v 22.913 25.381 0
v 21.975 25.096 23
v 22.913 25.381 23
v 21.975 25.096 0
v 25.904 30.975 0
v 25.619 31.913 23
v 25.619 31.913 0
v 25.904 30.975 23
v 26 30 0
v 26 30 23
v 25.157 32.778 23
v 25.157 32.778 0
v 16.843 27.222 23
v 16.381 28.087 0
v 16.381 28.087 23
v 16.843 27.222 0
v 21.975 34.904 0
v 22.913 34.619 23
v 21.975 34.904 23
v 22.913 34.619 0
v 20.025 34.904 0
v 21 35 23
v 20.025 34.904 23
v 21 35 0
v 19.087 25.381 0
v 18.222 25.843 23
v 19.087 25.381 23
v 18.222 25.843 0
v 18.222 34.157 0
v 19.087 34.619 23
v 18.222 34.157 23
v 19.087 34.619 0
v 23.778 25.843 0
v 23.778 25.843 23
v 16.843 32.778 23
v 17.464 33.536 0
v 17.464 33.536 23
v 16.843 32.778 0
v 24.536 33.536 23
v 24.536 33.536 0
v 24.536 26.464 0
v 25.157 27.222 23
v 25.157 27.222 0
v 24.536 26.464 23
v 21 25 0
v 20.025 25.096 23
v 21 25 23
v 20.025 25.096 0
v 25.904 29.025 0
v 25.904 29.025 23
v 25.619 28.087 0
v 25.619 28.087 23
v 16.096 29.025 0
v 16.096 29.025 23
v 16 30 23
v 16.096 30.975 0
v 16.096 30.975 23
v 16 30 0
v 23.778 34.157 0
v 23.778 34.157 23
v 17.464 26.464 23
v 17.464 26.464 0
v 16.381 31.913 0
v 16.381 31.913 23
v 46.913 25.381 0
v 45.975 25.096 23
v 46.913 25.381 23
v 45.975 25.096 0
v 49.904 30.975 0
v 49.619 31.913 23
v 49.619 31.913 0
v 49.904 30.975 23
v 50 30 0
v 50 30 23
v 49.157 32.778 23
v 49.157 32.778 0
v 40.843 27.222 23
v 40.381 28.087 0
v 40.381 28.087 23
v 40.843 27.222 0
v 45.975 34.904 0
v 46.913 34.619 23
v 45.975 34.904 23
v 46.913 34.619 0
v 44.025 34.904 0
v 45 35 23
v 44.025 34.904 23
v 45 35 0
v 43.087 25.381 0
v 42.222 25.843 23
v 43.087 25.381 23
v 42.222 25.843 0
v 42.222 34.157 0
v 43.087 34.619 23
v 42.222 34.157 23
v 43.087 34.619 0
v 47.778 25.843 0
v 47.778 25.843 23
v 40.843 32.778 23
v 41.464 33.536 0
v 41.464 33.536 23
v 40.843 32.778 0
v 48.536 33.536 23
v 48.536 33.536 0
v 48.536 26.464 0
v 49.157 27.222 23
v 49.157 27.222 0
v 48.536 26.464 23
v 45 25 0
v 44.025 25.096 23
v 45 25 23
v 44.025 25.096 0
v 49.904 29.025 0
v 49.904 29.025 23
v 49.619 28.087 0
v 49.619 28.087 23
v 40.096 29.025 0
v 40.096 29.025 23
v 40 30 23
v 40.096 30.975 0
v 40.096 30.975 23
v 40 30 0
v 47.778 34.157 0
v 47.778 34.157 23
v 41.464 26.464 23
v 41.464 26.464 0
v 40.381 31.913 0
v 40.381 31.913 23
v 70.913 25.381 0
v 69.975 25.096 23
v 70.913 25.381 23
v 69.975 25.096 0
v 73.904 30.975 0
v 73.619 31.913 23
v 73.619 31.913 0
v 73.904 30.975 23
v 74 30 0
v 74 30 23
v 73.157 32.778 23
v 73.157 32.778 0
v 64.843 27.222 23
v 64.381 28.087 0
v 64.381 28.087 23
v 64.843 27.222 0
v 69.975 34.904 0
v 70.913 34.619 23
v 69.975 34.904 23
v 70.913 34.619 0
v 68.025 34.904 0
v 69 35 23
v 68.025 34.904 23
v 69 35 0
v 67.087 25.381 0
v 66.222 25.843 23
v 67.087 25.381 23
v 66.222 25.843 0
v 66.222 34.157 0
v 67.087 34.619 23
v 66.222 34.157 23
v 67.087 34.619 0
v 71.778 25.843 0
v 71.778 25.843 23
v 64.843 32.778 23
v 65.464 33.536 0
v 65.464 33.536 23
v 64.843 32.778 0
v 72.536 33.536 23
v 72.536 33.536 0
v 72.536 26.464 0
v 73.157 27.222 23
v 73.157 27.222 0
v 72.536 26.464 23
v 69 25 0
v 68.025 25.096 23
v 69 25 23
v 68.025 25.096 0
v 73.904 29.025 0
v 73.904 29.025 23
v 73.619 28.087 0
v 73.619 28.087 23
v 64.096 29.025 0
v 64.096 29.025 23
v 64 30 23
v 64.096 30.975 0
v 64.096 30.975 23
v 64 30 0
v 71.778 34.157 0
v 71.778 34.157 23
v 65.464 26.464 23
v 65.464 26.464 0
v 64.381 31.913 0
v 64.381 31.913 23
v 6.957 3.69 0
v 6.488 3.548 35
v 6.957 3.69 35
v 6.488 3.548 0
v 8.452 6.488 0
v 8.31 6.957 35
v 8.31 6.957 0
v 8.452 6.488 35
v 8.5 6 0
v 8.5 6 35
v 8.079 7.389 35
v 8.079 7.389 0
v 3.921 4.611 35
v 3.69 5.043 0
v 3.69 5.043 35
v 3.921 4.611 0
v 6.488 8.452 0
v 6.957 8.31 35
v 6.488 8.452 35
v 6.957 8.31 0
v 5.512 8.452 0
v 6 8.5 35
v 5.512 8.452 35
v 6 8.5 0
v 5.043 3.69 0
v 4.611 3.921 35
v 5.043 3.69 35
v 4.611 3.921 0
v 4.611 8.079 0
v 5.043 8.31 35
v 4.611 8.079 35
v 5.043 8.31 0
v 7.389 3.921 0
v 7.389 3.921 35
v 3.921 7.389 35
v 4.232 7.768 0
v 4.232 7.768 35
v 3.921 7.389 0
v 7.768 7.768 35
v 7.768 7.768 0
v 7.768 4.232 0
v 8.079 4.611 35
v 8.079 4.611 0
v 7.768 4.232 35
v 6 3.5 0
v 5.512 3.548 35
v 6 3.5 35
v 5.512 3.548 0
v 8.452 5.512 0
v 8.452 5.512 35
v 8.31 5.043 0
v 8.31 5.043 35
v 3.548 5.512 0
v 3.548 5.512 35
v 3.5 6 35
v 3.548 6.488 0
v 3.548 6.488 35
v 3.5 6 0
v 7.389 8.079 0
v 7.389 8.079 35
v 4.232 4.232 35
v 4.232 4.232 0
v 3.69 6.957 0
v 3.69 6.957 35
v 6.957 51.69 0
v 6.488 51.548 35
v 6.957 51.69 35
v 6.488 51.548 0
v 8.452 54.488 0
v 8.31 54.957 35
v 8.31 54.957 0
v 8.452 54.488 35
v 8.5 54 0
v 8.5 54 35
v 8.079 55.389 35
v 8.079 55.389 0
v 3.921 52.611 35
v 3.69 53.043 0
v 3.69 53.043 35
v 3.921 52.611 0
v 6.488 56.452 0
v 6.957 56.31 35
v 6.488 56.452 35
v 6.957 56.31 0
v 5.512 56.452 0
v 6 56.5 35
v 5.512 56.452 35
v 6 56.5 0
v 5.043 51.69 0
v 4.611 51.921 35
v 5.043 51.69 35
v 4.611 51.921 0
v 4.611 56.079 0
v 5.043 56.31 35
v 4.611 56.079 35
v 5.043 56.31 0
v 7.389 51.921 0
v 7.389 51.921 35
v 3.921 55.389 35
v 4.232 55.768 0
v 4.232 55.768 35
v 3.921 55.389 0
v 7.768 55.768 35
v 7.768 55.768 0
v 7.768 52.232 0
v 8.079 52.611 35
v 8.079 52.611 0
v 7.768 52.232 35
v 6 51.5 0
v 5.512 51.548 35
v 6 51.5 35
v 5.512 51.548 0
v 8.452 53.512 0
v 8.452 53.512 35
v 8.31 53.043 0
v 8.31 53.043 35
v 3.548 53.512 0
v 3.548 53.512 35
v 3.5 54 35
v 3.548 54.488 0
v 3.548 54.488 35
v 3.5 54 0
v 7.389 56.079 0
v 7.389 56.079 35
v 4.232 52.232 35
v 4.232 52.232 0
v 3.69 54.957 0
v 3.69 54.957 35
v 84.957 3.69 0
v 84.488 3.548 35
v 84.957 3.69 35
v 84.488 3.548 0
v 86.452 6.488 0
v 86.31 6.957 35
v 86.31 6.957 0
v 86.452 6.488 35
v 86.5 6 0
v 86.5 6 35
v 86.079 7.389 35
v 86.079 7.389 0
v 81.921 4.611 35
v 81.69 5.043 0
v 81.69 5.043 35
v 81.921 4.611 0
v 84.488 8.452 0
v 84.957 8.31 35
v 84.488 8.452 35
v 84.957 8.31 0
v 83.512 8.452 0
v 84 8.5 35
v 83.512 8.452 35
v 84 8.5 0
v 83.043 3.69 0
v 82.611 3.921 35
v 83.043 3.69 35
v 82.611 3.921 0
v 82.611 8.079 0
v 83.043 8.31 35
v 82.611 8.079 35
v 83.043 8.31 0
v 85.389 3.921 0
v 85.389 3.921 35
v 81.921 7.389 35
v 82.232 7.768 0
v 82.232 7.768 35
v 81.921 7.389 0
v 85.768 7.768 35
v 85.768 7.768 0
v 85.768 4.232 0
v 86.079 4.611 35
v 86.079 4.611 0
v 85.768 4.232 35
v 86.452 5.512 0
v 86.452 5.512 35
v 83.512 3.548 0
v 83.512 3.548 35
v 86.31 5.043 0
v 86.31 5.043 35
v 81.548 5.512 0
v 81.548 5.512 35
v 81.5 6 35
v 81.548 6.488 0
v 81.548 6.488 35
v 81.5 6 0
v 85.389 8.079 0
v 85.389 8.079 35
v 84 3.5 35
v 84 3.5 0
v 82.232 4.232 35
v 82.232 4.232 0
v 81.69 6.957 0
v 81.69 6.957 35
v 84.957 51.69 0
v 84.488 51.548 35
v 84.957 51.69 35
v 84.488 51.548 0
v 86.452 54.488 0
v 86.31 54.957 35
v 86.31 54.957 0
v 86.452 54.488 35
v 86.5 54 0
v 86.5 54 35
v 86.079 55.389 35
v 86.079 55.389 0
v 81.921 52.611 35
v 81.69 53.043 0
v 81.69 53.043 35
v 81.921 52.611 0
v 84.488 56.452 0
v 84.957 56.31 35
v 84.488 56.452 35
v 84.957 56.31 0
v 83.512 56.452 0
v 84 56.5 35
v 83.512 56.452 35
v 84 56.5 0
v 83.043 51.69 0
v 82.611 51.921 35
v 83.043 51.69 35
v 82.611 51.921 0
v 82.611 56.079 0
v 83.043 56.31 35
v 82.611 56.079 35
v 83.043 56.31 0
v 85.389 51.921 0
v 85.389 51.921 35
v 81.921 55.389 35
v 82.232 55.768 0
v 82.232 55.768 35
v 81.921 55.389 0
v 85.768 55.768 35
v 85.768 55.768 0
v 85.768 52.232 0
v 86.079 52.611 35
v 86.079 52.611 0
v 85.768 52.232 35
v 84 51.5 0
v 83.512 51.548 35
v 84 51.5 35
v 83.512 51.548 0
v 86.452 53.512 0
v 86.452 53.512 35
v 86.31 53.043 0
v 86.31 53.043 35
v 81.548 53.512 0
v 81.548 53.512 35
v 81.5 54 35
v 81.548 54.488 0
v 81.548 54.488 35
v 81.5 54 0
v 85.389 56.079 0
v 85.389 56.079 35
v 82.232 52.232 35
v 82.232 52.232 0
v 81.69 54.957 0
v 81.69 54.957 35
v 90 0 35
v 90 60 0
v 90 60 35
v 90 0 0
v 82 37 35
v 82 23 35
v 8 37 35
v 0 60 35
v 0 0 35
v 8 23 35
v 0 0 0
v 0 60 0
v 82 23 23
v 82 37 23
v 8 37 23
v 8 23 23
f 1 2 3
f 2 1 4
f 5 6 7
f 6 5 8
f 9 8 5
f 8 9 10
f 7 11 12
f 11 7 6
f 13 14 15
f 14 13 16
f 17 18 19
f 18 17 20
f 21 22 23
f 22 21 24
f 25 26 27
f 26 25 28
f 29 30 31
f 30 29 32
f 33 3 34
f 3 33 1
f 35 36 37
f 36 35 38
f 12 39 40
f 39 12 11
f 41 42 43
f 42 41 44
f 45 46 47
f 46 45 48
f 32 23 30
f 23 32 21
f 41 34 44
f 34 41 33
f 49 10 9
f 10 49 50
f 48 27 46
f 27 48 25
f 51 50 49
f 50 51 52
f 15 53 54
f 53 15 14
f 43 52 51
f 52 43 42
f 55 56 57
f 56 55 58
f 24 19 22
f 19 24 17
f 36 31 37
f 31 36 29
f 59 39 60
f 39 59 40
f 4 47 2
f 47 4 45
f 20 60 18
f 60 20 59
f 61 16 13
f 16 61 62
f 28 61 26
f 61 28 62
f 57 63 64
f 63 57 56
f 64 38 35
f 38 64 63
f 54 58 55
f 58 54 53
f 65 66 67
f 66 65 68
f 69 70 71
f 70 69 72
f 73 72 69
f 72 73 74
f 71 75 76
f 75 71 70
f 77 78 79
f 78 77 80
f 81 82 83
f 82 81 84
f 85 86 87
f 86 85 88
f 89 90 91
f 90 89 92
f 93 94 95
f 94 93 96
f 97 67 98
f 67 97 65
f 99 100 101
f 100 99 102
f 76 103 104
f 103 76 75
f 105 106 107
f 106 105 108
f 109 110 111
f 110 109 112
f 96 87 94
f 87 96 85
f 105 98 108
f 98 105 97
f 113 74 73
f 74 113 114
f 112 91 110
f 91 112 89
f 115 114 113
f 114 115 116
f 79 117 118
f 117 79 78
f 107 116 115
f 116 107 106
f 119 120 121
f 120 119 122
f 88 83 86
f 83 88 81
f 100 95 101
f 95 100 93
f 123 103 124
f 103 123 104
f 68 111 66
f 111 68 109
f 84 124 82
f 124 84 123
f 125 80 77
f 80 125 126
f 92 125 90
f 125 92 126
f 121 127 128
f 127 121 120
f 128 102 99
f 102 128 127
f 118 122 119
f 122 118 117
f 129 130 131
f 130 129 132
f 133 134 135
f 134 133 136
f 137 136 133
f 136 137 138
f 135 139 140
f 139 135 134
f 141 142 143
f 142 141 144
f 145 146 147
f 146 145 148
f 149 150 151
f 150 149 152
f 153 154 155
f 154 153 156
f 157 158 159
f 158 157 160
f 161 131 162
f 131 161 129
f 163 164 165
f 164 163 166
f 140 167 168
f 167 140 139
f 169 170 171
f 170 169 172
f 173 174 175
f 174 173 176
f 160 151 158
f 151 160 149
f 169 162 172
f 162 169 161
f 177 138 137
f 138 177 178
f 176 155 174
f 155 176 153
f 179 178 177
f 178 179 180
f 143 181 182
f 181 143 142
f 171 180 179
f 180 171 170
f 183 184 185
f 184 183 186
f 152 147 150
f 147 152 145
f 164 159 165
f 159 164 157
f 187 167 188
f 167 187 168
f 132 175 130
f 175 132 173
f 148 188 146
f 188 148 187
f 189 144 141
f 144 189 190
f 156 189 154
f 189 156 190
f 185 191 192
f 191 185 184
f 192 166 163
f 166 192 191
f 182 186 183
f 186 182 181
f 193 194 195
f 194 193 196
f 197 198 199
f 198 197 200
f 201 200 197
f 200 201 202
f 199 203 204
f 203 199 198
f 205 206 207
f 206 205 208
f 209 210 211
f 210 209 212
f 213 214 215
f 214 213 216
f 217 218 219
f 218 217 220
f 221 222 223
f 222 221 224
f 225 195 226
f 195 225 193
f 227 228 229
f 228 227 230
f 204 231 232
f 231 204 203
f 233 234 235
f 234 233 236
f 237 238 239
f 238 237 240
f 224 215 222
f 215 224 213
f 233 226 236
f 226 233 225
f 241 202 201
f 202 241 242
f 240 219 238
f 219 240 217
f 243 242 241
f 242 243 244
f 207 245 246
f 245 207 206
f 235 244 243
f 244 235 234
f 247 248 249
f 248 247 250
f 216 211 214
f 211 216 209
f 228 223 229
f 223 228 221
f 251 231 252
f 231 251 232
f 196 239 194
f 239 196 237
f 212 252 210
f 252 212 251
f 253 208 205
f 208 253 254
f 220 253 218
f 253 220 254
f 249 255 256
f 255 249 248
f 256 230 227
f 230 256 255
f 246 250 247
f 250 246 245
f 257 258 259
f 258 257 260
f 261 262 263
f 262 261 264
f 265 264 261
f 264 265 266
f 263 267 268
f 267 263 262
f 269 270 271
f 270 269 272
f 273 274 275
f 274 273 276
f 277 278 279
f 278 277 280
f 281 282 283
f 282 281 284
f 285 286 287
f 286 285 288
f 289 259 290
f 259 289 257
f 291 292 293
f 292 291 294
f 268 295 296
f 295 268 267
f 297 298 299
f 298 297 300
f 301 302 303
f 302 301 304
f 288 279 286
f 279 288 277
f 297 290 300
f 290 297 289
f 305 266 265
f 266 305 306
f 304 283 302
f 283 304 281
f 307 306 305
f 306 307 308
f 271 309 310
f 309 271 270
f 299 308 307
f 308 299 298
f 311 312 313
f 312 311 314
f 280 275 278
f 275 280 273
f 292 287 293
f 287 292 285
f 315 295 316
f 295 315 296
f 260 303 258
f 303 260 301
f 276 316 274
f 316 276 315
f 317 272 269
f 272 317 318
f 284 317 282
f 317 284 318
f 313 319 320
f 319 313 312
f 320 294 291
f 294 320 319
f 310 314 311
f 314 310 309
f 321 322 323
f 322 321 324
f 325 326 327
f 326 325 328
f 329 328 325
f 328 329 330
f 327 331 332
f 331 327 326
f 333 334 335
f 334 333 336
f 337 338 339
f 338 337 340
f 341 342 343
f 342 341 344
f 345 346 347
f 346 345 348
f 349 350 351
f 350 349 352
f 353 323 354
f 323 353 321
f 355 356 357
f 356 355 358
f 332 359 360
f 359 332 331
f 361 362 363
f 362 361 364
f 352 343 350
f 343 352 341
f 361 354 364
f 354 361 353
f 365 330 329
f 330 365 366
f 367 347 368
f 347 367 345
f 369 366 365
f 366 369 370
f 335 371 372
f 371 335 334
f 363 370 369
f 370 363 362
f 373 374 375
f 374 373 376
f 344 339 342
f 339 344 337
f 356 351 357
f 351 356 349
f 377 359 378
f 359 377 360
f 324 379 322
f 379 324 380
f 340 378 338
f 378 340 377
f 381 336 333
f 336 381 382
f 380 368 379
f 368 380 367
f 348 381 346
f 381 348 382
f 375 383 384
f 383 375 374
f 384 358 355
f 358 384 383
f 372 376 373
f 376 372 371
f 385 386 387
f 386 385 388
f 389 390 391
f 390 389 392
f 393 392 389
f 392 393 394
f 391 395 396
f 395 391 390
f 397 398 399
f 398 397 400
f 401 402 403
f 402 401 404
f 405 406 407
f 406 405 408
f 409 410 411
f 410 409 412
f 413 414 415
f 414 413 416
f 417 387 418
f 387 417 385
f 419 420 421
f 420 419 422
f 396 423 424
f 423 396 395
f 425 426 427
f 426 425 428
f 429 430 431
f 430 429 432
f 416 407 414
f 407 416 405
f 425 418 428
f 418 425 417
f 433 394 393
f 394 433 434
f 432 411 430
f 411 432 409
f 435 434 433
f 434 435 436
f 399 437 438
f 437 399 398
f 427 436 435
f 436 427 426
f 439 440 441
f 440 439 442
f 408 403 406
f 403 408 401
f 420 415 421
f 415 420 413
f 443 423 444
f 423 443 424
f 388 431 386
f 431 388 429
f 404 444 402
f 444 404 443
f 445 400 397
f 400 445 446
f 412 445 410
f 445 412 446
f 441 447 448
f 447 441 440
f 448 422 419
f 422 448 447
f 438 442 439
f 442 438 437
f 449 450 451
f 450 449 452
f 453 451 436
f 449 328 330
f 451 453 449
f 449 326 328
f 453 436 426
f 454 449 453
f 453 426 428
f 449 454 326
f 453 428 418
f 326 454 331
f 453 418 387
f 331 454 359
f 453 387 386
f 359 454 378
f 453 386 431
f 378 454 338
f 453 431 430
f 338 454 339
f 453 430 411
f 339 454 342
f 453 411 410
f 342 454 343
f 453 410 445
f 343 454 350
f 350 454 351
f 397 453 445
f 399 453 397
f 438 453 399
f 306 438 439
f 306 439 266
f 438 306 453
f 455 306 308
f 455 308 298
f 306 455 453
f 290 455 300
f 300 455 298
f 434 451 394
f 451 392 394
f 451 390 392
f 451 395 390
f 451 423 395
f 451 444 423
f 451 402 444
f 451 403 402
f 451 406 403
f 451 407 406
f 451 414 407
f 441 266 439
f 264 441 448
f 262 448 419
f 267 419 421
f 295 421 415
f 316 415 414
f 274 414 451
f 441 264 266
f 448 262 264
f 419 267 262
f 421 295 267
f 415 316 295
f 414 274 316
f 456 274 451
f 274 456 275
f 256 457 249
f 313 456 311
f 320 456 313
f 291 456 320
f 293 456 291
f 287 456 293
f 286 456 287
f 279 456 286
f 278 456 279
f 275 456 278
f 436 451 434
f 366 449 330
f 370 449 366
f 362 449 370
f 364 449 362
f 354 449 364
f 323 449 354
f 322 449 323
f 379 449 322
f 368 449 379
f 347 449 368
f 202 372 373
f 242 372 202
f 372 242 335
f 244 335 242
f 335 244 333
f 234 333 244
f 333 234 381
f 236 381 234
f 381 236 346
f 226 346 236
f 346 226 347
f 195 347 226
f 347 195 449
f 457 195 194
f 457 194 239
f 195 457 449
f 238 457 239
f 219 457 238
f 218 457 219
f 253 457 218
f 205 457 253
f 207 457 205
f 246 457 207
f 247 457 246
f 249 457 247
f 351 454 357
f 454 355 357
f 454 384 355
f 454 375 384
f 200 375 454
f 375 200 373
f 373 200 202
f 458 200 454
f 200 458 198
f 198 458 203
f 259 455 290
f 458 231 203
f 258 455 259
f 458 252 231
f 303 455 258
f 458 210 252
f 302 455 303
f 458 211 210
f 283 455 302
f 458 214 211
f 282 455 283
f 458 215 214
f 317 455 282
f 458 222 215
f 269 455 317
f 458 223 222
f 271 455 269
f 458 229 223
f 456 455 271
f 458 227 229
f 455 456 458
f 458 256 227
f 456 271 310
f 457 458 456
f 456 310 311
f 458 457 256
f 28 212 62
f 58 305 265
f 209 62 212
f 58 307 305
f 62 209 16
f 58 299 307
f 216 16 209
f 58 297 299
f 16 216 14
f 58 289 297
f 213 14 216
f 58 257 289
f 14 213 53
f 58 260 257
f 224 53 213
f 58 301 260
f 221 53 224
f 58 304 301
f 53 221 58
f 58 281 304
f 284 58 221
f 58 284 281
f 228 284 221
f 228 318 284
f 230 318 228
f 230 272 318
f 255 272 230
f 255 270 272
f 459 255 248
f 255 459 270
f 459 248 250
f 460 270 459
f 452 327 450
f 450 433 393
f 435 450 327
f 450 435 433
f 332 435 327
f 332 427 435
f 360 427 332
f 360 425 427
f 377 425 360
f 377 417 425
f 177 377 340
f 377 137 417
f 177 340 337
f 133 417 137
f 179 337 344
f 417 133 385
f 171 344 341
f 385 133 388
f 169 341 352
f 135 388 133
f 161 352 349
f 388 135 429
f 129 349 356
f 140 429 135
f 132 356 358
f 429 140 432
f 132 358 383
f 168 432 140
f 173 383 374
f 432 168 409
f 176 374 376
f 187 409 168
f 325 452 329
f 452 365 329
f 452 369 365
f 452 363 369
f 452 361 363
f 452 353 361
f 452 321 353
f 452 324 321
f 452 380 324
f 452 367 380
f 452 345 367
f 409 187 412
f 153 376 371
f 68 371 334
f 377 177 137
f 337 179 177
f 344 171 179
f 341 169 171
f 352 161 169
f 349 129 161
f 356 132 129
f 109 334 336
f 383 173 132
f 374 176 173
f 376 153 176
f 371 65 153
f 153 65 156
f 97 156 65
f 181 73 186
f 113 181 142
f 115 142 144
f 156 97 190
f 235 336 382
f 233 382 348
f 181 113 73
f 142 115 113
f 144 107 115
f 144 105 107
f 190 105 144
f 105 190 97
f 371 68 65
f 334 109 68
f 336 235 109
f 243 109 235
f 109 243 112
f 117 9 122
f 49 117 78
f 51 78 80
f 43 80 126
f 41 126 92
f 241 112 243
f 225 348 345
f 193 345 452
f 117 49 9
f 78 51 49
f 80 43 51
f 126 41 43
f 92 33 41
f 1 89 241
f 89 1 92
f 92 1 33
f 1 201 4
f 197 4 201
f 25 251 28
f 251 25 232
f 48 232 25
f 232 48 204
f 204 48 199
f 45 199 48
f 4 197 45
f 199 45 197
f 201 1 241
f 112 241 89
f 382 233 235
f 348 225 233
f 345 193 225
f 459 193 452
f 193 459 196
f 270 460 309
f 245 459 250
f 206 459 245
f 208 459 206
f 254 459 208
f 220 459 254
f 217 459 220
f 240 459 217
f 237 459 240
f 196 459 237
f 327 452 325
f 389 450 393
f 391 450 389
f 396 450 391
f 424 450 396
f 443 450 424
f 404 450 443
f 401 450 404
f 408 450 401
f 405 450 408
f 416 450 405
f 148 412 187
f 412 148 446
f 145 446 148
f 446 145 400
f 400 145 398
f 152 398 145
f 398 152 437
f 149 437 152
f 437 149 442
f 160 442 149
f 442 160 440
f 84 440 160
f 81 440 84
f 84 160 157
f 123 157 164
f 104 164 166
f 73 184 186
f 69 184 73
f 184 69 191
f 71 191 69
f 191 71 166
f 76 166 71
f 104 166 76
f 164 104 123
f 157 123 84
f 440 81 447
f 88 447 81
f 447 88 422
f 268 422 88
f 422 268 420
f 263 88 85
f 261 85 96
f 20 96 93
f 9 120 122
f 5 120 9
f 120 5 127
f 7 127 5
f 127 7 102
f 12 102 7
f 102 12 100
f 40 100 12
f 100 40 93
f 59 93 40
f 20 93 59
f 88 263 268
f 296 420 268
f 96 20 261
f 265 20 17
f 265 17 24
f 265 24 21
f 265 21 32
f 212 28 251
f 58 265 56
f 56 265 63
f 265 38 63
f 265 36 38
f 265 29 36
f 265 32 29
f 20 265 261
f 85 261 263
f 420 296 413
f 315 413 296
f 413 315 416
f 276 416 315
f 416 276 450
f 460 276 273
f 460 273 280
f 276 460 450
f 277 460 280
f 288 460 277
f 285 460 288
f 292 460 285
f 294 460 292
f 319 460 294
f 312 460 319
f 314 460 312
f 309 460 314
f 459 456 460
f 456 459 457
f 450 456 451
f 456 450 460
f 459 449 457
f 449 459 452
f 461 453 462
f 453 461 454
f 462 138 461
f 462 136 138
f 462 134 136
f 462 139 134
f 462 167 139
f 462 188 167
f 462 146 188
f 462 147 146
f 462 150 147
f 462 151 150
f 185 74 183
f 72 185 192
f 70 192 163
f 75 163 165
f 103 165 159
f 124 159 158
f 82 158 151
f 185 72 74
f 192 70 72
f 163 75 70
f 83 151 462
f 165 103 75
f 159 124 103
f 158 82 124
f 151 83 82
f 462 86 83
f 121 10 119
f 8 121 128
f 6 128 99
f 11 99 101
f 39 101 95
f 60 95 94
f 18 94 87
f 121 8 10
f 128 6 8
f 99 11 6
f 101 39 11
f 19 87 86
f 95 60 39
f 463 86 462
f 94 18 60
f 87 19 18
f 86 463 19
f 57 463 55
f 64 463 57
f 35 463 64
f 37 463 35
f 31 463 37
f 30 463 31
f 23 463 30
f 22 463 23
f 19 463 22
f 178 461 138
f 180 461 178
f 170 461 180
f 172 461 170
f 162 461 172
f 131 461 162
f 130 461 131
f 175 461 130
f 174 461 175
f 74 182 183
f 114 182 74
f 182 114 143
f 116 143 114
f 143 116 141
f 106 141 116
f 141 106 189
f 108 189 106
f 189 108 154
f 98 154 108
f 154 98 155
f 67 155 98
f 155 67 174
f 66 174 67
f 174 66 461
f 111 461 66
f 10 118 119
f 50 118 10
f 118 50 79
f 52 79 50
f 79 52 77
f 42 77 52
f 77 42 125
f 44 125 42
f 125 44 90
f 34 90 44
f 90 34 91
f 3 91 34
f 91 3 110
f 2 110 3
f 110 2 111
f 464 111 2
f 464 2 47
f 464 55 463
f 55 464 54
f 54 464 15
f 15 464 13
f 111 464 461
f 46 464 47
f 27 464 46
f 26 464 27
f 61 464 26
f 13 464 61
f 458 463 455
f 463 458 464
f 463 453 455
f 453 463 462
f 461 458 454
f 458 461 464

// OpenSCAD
$fn = 32;

// ----------------------------------------------------------------------
// Manifold block: gallery_top manifold
// ----------------------------------------------------------------------

// --- parameters (mm) ---
block_l = 90;             // block length, X
block_w = 60;             // block width, Y
block_h = 35;             // block height, Z
port_d = 10;              // port bore diameter
port_pitch = 24;          // port pitch along X
gallery_d = 14;           // top gallery width, Y
gallery_depth = 12;       // gallery pocket depth
wall_p = 8;               // gallery end wall thickness, X
mnt_d = 5;                // mounting hole diameter
mnt_in = 6;               // mounting hole inset from the edges

n_ports = 3;  // ports in the row
port_x0 = (block_l - (n_ports - 1) * port_pitch) / 2;  // first port X

difference() {
  cube([block_l, block_w, block_h]);
  for (i = [0 : n_ports - 1])
    translate([port_x0 + i * port_pitch, block_w / 2, -1])
      cylinder(h = block_h + 2, d = port_d);
  translate([wall_p, block_w / 2 - gallery_d / 2, block_h - gallery_depth])
    cube([block_l - 2 * wall_p, gallery_d, gallery_depth + 1]);
  for (cx = [mnt_in, block_l - mnt_in])
    for (cy = [mnt_in, block_w - mnt_in])
      translate([cx, cy, -1]) cylinder(h = block_h + 2, d = mnt_d);
}
